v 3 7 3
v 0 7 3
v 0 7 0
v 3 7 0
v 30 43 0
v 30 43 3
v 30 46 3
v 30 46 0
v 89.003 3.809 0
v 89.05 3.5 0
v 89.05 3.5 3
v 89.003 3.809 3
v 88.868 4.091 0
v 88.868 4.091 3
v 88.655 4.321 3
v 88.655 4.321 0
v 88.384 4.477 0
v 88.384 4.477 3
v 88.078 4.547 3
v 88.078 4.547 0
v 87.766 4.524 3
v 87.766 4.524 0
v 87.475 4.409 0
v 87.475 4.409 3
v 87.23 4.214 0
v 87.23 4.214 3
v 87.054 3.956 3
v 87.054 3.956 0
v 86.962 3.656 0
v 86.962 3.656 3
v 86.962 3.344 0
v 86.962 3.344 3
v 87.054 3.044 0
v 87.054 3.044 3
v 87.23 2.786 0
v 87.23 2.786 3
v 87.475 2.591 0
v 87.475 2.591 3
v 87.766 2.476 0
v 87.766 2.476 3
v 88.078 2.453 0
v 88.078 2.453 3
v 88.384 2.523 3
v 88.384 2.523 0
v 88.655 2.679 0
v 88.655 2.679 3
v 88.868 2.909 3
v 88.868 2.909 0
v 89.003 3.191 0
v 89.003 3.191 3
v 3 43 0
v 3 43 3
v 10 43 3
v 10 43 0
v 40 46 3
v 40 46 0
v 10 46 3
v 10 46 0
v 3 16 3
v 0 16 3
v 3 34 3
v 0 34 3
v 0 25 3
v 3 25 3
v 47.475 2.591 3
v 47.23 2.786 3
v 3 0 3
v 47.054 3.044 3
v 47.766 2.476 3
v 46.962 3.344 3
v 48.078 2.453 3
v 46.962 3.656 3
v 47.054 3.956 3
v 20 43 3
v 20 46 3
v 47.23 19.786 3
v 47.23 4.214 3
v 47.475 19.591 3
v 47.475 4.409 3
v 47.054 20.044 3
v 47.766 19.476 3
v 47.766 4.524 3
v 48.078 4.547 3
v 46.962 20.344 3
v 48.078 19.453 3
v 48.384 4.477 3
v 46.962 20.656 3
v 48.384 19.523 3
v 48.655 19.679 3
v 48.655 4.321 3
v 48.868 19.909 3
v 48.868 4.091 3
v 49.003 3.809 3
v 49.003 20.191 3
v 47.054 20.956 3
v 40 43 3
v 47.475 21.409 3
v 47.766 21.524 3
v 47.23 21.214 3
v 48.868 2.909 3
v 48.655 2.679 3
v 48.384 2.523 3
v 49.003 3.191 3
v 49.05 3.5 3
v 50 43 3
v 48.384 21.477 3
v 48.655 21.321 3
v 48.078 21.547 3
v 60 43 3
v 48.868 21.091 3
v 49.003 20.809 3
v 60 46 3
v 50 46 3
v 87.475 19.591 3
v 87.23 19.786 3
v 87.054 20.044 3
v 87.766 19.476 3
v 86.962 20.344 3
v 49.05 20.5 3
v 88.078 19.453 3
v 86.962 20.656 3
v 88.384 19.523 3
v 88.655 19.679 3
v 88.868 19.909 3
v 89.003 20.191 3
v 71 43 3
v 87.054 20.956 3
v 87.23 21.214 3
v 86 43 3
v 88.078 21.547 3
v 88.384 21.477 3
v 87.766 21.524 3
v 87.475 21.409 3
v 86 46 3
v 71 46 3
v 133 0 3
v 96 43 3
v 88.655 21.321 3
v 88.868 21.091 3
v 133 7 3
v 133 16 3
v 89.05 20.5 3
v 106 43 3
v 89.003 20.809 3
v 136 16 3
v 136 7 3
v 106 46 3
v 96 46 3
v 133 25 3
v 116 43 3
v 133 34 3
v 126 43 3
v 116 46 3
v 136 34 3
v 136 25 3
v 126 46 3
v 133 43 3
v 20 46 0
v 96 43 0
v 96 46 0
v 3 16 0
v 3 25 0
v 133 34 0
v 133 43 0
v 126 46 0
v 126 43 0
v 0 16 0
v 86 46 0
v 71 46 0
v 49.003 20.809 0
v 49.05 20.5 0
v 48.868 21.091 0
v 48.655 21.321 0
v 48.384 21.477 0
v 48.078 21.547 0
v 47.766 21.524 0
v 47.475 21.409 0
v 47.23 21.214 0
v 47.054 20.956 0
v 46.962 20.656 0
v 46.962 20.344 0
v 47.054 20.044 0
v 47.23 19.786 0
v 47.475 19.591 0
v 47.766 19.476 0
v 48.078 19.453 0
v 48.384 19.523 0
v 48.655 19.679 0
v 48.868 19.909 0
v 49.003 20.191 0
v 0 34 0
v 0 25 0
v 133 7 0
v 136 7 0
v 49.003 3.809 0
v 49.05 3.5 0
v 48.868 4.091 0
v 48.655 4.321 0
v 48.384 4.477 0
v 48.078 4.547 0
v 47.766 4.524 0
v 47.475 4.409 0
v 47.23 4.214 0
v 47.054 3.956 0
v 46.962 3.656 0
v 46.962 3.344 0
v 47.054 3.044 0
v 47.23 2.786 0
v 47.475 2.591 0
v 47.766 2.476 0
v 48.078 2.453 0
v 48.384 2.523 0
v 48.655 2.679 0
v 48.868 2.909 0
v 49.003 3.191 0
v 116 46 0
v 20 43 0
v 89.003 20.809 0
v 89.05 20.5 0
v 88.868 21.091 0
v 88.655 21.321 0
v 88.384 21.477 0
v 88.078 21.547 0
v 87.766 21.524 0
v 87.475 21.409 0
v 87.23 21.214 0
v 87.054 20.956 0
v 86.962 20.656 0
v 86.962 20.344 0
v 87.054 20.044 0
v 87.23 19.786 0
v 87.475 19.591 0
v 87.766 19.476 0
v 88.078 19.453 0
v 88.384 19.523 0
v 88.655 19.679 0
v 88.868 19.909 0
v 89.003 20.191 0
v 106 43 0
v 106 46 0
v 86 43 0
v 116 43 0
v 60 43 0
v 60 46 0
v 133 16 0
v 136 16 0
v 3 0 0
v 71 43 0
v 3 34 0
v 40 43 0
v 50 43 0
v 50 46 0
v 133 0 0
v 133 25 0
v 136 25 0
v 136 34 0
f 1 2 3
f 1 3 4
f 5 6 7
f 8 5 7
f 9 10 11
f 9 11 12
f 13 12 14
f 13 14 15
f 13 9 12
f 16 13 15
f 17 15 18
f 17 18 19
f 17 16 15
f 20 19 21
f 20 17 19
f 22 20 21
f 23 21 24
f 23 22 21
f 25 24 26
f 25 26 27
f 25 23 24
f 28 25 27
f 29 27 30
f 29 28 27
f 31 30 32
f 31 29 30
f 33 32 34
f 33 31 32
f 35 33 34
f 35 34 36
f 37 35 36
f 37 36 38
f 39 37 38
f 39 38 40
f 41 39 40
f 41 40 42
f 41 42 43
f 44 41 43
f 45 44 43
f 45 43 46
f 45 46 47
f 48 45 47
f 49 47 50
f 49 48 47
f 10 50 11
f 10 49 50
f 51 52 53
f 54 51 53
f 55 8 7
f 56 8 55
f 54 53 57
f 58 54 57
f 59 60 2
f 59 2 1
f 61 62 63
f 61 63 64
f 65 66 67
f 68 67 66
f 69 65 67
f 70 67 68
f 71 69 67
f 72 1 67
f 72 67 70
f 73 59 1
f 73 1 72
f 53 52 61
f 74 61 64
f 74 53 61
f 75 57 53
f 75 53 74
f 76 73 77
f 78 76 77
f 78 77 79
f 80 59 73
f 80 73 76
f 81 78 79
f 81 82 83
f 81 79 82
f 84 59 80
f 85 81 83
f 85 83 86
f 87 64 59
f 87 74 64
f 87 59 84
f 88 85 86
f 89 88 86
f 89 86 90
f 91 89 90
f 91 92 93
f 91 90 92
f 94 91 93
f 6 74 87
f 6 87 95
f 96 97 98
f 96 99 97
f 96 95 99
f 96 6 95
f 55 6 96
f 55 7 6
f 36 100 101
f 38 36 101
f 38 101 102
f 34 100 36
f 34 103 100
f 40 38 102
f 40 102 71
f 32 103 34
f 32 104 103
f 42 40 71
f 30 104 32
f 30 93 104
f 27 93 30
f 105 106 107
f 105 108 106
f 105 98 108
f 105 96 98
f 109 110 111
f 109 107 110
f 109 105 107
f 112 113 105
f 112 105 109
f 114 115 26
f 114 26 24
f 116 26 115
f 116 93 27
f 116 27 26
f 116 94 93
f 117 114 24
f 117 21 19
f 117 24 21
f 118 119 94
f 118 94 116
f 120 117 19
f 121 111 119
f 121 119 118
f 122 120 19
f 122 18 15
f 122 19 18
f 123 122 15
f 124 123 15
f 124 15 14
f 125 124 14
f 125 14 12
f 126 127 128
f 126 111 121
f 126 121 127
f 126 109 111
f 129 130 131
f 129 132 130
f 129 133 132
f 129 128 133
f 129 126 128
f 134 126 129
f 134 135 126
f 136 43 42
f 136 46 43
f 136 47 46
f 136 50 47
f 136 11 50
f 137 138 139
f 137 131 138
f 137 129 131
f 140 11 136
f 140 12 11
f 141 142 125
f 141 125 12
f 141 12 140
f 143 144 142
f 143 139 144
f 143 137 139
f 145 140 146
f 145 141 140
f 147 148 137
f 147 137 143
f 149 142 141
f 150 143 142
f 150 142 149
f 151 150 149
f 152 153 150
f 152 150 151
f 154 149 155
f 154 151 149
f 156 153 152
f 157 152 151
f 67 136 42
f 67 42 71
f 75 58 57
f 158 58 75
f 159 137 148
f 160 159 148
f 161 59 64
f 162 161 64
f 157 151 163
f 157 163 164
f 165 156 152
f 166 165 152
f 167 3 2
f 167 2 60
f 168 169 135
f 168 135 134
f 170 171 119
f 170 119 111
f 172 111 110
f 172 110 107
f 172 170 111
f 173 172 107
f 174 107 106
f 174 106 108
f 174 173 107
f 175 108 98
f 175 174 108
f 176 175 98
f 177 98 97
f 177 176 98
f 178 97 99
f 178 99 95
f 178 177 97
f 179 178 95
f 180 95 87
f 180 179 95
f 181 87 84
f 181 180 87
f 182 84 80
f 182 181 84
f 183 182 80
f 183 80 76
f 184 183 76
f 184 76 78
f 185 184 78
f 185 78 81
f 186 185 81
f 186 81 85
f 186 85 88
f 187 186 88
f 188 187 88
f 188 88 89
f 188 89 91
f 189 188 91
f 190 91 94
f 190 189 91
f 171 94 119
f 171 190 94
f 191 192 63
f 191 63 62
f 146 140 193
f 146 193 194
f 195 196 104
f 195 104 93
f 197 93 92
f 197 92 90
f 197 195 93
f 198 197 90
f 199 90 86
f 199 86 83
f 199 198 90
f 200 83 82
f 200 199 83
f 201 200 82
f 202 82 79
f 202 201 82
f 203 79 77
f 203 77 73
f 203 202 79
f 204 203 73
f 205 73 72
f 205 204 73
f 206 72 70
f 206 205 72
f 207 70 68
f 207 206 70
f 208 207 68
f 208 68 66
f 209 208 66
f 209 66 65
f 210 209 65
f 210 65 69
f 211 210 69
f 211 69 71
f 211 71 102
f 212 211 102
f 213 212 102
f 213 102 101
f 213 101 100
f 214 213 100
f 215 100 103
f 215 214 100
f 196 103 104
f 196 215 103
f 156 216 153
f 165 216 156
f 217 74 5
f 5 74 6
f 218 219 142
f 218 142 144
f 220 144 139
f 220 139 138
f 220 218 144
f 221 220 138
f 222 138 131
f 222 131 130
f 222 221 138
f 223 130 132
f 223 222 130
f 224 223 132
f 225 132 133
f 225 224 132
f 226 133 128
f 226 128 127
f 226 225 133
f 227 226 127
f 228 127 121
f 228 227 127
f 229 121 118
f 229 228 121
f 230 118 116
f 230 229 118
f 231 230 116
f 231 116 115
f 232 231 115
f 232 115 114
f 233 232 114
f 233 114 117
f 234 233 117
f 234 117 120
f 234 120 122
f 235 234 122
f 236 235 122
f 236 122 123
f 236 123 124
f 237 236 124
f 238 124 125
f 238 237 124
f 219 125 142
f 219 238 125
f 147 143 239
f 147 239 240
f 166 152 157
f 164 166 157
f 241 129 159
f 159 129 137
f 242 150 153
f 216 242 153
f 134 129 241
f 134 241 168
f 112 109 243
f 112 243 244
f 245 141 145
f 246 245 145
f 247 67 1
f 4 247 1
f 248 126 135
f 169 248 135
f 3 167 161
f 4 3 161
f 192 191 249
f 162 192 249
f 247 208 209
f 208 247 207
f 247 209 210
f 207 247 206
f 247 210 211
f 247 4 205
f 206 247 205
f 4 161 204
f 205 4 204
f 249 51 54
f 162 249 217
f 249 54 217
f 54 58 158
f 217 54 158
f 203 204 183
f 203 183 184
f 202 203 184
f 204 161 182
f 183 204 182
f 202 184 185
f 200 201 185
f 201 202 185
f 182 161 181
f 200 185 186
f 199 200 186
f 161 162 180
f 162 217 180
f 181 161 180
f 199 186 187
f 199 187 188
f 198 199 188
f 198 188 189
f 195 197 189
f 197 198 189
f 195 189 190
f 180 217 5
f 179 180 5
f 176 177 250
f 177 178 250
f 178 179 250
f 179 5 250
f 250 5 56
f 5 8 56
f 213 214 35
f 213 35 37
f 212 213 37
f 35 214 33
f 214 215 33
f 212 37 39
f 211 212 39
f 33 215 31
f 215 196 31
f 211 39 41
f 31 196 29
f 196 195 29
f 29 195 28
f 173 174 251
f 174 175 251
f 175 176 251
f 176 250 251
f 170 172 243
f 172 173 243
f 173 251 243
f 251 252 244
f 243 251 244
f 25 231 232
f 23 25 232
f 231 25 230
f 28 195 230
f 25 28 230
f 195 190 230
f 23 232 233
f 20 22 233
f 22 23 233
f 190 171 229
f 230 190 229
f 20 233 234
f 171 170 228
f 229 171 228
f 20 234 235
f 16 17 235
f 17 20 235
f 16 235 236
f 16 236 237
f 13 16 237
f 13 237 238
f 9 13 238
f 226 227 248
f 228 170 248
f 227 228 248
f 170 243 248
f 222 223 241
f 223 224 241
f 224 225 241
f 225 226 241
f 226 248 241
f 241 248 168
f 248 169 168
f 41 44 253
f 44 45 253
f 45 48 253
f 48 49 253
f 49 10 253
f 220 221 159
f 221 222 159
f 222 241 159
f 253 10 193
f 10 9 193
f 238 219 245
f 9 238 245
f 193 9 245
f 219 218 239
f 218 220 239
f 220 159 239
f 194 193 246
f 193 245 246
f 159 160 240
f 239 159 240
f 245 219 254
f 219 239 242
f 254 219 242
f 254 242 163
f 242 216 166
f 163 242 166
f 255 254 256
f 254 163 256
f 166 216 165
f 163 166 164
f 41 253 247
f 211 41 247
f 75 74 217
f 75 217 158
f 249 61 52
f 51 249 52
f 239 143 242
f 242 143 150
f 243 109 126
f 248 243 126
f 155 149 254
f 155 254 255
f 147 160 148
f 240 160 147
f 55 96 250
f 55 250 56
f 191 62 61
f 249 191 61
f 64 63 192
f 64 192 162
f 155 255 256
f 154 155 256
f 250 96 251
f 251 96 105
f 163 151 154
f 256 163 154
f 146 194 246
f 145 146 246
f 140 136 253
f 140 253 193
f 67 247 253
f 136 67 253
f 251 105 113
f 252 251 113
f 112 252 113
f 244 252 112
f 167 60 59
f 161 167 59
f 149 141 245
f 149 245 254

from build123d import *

# Parameters (mm, degrees)
SKETCH1_W           = 136
SKETCH1_H           = 46
SKETCH1_R           = 1.05
BOSS_EXTRUDE1_DEPTH = 3
CUT_EXTRUDE1_REACH  = 5
SKETCH4_W           = 3
SKETCH4_H           = 9
SKETCH4_H_2         = 7
SKETCH4_W_2         = 10
SKETCH4_H_3         = 3
SKETCH4_W_3         = 11


with BuildPart() as part:
    # Sketch1 → Boss-Extrude1 (new body)
    with BuildSketch(Plane.XY):
        with Locations((68, 23)):
            Rectangle(SKETCH1_W, SKETCH1_H)
        with Locations((88, 20.5)):
            Circle(SKETCH1_R, mode=Mode.SUBTRACT)
        with Locations((48, 20.5)):
            Circle(SKETCH1_R, mode=Mode.SUBTRACT)
        with Locations((48, 3.5)):
            Circle(SKETCH1_R, mode=Mode.SUBTRACT)
        with Locations((88, 3.5)):
            Circle(SKETCH1_R, mode=Mode.SUBTRACT)
    extrude(amount=BOSS_EXTRUDE1_DEPTH)

    # Sketch4 → Cut-Extrude1 (cut, up to next)
    with BuildSketch(Plane.XY.offset(3), mode=Mode.PRIVATE) as cut_extrude1_sk1:
        Polygon((0, 46), (0, 43), (3, 43), (10, 43), (10, 46), align=None)
    cut_extrude1_tool1 = extrude(cut_extrude1_sk1.sketch, amount=-CUT_EXTRUDE1_REACH, mode=Mode.PRIVATE) & part.part
    add(cut_extrude1_tool1.solids().sort_by_distance((5, 44.5, 3))[0], mode=Mode.SUBTRACT)
    # Sketch4 → Cut-Extrude1 (cut, up to next)
    with BuildSketch(Plane.XY.offset(3), mode=Mode.PRIVATE) as cut_extrude1_sk2:
        with Locations((1.5, 38.5)):
            Rectangle(SKETCH4_W, SKETCH4_H)
    cut_extrude1_tool2 = extrude(cut_extrude1_sk2.sketch, amount=-CUT_EXTRUDE1_REACH, mode=Mode.PRIVATE) & part.part
    add(cut_extrude1_tool2.solids().sort_by_distance((1.5, 38.5, 3))[0], mode=Mode.SUBTRACT)
    # Sketch4 → Cut-Extrude1 (cut, up to next)
    with BuildSketch(Plane.XY.offset(3), mode=Mode.PRIVATE) as cut_extrude1_sk3:
        with Locations((1.5, 20.5)):
            Rectangle(SKETCH4_W, SKETCH4_H)
    cut_extrude1_tool3 = extrude(cut_extrude1_sk3.sketch, amount=-CUT_EXTRUDE1_REACH, mode=Mode.PRIVATE) & part.part
    add(cut_extrude1_tool3.solids().sort_by_distance((1.5, 20.5, 3))[0], mode=Mode.SUBTRACT)
    # Sketch4 → Cut-Extrude1 (cut, up to next)
    with BuildSketch(Plane.XY.offset(3), mode=Mode.PRIVATE) as cut_extrude1_sk4:
        with Locations((1.5, 3.5)):
            Rectangle(SKETCH4_W, SKETCH4_H_2)
    cut_extrude1_tool4 = extrude(cut_extrude1_sk4.sketch, amount=-CUT_EXTRUDE1_REACH, mode=Mode.PRIVATE) & part.part
    add(cut_extrude1_tool4.solids().sort_by_distance((1.5, 3.5, 3))[0], mode=Mode.SUBTRACT)
    # Sketch4 → Cut-Extrude1 (cut, up to next)
    with BuildSketch(Plane.XY.offset(3), mode=Mode.PRIVATE) as cut_extrude1_sk5:
        with Locations((25, 44.5)):
            Rectangle(SKETCH4_W_2, SKETCH4_H_3)
    cut_extrude1_tool5 = extrude(cut_extrude1_sk5.sketch, amount=-CUT_EXTRUDE1_REACH, mode=Mode.PRIVATE) & part.part
    add(cut_extrude1_tool5.solids().sort_by_distance((25, 44.5, 3))[0], mode=Mode.SUBTRACT)
    # Sketch4 → Cut-Extrude1 (cut, up to next)
    with BuildSketch(Plane.XY.offset(3), mode=Mode.PRIVATE) as cut_extrude1_sk6:
        with Locations((45, 44.5)):
            Rectangle(SKETCH4_W_2, SKETCH4_H_3)
    cut_extrude1_tool6 = extrude(cut_extrude1_sk6.sketch, amount=-CUT_EXTRUDE1_REACH, mode=Mode.PRIVATE) & part.part
    add(cut_extrude1_tool6.solids().sort_by_distance((45, 44.5, 3))[0], mode=Mode.SUBTRACT)
    # Sketch4 → Cut-Extrude1 (cut, up to next)
    with BuildSketch(Plane.XY.offset(3), mode=Mode.PRIVATE) as cut_extrude1_sk7:
        with Locations((65.5, 44.5)):
            Rectangle(SKETCH4_W_3, SKETCH4_H_3)
    cut_extrude1_tool7 = extrude(cut_extrude1_sk7.sketch, amount=-CUT_EXTRUDE1_REACH, mode=Mode.PRIVATE) & part.part
    add(cut_extrude1_tool7.solids().sort_by_distance((65.5, 44.5, 3))[0], mode=Mode.SUBTRACT)
    # Sketch4 → Cut-Extrude1 (cut, up to next)
    with BuildSketch(Plane.XY.offset(3), mode=Mode.PRIVATE) as cut_extrude1_sk8:
        with Locations((91, 44.5)):
            Rectangle(SKETCH4_W_2, SKETCH4_H_3)
    cut_extrude1_tool8 = extrude(cut_extrude1_sk8.sketch, amount=-CUT_EXTRUDE1_REACH, mode=Mode.PRIVATE) & part.part
    add(cut_extrude1_tool8.solids().sort_by_distance((91, 44.5, 3))[0], mode=Mode.SUBTRACT)
    # Sketch4 → Cut-Extrude1 (cut, up to next)
    with BuildSketch(Plane.XY.offset(3), mode=Mode.PRIVATE) as cut_extrude1_sk9:
        with Locations((111, 44.5)):
            Rectangle(SKETCH4_W_2, SKETCH4_H_3)
    cut_extrude1_tool9 = extrude(cut_extrude1_sk9.sketch, amount=-CUT_EXTRUDE1_REACH, mode=Mode.PRIVATE) & part.part
    add(cut_extrude1_tool9.solids().sort_by_distance((111, 44.5, 3))[0], mode=Mode.SUBTRACT)
    # Sketch4 → Cut-Extrude1 (cut, up to next)
    with BuildSketch(Plane.XY.offset(3), mode=Mode.PRIVATE) as cut_extrude1_sk10:
        Polygon((133, 43), (136, 43), (136, 46), (126, 46), (126, 43), align=None)
    cut_extrude1_tool10 = extrude(cut_extrude1_sk10.sketch, amount=-CUT_EXTRUDE1_REACH, mode=Mode.PRIVATE) & part.part
    add(cut_extrude1_tool10.solids().sort_by_distance((131, 44.5, 3))[0], mode=Mode.SUBTRACT)
    # Sketch4 → Cut-Extrude1 (cut, up to next)
    with BuildSketch(Plane.XY.offset(3), mode=Mode.PRIVATE) as cut_extrude1_sk11:
        with Locations((134.5, 38.5)):
            Rectangle(SKETCH4_W, SKETCH4_H)
    cut_extrude1_tool11 = extrude(cut_extrude1_sk11.sketch, amount=-CUT_EXTRUDE1_REACH, mode=Mode.PRIVATE) & part.part
    add(cut_extrude1_tool11.solids().sort_by_distance((134.5, 38.5, 3))[0], mode=Mode.SUBTRACT)
    # Sketch4 → Cut-Extrude1 (cut, up to next)
    with BuildSketch(Plane.XY.offset(3), mode=Mode.PRIVATE) as cut_extrude1_sk12:
        with Locations((134.5, 20.5)):
            Rectangle(SKETCH4_W, SKETCH4_H)
    cut_extrude1_tool12 = extrude(cut_extrude1_sk12.sketch, amount=-CUT_EXTRUDE1_REACH, mode=Mode.PRIVATE) & part.part
    add(cut_extrude1_tool12.solids().sort_by_distance((134.5, 20.5, 3))[0], mode=Mode.SUBTRACT)
    # Sketch4 → Cut-Extrude1 (cut, up to next)
    with BuildSketch(Plane.XY.offset(3), mode=Mode.PRIVATE) as cut_extrude1_sk13:
        with Locations((134.5, 3.5)):
            Rectangle(SKETCH4_W, SKETCH4_H_2)
    cut_extrude1_tool13 = extrude(cut_extrude1_sk13.sketch, amount=-CUT_EXTRUDE1_REACH, mode=Mode.PRIVATE) & part.part
    add(cut_extrude1_tool13.solids().sort_by_distance((134.5, 3.5, 3))[0], mode=Mode.SUBTRACT)


solid = part.part
